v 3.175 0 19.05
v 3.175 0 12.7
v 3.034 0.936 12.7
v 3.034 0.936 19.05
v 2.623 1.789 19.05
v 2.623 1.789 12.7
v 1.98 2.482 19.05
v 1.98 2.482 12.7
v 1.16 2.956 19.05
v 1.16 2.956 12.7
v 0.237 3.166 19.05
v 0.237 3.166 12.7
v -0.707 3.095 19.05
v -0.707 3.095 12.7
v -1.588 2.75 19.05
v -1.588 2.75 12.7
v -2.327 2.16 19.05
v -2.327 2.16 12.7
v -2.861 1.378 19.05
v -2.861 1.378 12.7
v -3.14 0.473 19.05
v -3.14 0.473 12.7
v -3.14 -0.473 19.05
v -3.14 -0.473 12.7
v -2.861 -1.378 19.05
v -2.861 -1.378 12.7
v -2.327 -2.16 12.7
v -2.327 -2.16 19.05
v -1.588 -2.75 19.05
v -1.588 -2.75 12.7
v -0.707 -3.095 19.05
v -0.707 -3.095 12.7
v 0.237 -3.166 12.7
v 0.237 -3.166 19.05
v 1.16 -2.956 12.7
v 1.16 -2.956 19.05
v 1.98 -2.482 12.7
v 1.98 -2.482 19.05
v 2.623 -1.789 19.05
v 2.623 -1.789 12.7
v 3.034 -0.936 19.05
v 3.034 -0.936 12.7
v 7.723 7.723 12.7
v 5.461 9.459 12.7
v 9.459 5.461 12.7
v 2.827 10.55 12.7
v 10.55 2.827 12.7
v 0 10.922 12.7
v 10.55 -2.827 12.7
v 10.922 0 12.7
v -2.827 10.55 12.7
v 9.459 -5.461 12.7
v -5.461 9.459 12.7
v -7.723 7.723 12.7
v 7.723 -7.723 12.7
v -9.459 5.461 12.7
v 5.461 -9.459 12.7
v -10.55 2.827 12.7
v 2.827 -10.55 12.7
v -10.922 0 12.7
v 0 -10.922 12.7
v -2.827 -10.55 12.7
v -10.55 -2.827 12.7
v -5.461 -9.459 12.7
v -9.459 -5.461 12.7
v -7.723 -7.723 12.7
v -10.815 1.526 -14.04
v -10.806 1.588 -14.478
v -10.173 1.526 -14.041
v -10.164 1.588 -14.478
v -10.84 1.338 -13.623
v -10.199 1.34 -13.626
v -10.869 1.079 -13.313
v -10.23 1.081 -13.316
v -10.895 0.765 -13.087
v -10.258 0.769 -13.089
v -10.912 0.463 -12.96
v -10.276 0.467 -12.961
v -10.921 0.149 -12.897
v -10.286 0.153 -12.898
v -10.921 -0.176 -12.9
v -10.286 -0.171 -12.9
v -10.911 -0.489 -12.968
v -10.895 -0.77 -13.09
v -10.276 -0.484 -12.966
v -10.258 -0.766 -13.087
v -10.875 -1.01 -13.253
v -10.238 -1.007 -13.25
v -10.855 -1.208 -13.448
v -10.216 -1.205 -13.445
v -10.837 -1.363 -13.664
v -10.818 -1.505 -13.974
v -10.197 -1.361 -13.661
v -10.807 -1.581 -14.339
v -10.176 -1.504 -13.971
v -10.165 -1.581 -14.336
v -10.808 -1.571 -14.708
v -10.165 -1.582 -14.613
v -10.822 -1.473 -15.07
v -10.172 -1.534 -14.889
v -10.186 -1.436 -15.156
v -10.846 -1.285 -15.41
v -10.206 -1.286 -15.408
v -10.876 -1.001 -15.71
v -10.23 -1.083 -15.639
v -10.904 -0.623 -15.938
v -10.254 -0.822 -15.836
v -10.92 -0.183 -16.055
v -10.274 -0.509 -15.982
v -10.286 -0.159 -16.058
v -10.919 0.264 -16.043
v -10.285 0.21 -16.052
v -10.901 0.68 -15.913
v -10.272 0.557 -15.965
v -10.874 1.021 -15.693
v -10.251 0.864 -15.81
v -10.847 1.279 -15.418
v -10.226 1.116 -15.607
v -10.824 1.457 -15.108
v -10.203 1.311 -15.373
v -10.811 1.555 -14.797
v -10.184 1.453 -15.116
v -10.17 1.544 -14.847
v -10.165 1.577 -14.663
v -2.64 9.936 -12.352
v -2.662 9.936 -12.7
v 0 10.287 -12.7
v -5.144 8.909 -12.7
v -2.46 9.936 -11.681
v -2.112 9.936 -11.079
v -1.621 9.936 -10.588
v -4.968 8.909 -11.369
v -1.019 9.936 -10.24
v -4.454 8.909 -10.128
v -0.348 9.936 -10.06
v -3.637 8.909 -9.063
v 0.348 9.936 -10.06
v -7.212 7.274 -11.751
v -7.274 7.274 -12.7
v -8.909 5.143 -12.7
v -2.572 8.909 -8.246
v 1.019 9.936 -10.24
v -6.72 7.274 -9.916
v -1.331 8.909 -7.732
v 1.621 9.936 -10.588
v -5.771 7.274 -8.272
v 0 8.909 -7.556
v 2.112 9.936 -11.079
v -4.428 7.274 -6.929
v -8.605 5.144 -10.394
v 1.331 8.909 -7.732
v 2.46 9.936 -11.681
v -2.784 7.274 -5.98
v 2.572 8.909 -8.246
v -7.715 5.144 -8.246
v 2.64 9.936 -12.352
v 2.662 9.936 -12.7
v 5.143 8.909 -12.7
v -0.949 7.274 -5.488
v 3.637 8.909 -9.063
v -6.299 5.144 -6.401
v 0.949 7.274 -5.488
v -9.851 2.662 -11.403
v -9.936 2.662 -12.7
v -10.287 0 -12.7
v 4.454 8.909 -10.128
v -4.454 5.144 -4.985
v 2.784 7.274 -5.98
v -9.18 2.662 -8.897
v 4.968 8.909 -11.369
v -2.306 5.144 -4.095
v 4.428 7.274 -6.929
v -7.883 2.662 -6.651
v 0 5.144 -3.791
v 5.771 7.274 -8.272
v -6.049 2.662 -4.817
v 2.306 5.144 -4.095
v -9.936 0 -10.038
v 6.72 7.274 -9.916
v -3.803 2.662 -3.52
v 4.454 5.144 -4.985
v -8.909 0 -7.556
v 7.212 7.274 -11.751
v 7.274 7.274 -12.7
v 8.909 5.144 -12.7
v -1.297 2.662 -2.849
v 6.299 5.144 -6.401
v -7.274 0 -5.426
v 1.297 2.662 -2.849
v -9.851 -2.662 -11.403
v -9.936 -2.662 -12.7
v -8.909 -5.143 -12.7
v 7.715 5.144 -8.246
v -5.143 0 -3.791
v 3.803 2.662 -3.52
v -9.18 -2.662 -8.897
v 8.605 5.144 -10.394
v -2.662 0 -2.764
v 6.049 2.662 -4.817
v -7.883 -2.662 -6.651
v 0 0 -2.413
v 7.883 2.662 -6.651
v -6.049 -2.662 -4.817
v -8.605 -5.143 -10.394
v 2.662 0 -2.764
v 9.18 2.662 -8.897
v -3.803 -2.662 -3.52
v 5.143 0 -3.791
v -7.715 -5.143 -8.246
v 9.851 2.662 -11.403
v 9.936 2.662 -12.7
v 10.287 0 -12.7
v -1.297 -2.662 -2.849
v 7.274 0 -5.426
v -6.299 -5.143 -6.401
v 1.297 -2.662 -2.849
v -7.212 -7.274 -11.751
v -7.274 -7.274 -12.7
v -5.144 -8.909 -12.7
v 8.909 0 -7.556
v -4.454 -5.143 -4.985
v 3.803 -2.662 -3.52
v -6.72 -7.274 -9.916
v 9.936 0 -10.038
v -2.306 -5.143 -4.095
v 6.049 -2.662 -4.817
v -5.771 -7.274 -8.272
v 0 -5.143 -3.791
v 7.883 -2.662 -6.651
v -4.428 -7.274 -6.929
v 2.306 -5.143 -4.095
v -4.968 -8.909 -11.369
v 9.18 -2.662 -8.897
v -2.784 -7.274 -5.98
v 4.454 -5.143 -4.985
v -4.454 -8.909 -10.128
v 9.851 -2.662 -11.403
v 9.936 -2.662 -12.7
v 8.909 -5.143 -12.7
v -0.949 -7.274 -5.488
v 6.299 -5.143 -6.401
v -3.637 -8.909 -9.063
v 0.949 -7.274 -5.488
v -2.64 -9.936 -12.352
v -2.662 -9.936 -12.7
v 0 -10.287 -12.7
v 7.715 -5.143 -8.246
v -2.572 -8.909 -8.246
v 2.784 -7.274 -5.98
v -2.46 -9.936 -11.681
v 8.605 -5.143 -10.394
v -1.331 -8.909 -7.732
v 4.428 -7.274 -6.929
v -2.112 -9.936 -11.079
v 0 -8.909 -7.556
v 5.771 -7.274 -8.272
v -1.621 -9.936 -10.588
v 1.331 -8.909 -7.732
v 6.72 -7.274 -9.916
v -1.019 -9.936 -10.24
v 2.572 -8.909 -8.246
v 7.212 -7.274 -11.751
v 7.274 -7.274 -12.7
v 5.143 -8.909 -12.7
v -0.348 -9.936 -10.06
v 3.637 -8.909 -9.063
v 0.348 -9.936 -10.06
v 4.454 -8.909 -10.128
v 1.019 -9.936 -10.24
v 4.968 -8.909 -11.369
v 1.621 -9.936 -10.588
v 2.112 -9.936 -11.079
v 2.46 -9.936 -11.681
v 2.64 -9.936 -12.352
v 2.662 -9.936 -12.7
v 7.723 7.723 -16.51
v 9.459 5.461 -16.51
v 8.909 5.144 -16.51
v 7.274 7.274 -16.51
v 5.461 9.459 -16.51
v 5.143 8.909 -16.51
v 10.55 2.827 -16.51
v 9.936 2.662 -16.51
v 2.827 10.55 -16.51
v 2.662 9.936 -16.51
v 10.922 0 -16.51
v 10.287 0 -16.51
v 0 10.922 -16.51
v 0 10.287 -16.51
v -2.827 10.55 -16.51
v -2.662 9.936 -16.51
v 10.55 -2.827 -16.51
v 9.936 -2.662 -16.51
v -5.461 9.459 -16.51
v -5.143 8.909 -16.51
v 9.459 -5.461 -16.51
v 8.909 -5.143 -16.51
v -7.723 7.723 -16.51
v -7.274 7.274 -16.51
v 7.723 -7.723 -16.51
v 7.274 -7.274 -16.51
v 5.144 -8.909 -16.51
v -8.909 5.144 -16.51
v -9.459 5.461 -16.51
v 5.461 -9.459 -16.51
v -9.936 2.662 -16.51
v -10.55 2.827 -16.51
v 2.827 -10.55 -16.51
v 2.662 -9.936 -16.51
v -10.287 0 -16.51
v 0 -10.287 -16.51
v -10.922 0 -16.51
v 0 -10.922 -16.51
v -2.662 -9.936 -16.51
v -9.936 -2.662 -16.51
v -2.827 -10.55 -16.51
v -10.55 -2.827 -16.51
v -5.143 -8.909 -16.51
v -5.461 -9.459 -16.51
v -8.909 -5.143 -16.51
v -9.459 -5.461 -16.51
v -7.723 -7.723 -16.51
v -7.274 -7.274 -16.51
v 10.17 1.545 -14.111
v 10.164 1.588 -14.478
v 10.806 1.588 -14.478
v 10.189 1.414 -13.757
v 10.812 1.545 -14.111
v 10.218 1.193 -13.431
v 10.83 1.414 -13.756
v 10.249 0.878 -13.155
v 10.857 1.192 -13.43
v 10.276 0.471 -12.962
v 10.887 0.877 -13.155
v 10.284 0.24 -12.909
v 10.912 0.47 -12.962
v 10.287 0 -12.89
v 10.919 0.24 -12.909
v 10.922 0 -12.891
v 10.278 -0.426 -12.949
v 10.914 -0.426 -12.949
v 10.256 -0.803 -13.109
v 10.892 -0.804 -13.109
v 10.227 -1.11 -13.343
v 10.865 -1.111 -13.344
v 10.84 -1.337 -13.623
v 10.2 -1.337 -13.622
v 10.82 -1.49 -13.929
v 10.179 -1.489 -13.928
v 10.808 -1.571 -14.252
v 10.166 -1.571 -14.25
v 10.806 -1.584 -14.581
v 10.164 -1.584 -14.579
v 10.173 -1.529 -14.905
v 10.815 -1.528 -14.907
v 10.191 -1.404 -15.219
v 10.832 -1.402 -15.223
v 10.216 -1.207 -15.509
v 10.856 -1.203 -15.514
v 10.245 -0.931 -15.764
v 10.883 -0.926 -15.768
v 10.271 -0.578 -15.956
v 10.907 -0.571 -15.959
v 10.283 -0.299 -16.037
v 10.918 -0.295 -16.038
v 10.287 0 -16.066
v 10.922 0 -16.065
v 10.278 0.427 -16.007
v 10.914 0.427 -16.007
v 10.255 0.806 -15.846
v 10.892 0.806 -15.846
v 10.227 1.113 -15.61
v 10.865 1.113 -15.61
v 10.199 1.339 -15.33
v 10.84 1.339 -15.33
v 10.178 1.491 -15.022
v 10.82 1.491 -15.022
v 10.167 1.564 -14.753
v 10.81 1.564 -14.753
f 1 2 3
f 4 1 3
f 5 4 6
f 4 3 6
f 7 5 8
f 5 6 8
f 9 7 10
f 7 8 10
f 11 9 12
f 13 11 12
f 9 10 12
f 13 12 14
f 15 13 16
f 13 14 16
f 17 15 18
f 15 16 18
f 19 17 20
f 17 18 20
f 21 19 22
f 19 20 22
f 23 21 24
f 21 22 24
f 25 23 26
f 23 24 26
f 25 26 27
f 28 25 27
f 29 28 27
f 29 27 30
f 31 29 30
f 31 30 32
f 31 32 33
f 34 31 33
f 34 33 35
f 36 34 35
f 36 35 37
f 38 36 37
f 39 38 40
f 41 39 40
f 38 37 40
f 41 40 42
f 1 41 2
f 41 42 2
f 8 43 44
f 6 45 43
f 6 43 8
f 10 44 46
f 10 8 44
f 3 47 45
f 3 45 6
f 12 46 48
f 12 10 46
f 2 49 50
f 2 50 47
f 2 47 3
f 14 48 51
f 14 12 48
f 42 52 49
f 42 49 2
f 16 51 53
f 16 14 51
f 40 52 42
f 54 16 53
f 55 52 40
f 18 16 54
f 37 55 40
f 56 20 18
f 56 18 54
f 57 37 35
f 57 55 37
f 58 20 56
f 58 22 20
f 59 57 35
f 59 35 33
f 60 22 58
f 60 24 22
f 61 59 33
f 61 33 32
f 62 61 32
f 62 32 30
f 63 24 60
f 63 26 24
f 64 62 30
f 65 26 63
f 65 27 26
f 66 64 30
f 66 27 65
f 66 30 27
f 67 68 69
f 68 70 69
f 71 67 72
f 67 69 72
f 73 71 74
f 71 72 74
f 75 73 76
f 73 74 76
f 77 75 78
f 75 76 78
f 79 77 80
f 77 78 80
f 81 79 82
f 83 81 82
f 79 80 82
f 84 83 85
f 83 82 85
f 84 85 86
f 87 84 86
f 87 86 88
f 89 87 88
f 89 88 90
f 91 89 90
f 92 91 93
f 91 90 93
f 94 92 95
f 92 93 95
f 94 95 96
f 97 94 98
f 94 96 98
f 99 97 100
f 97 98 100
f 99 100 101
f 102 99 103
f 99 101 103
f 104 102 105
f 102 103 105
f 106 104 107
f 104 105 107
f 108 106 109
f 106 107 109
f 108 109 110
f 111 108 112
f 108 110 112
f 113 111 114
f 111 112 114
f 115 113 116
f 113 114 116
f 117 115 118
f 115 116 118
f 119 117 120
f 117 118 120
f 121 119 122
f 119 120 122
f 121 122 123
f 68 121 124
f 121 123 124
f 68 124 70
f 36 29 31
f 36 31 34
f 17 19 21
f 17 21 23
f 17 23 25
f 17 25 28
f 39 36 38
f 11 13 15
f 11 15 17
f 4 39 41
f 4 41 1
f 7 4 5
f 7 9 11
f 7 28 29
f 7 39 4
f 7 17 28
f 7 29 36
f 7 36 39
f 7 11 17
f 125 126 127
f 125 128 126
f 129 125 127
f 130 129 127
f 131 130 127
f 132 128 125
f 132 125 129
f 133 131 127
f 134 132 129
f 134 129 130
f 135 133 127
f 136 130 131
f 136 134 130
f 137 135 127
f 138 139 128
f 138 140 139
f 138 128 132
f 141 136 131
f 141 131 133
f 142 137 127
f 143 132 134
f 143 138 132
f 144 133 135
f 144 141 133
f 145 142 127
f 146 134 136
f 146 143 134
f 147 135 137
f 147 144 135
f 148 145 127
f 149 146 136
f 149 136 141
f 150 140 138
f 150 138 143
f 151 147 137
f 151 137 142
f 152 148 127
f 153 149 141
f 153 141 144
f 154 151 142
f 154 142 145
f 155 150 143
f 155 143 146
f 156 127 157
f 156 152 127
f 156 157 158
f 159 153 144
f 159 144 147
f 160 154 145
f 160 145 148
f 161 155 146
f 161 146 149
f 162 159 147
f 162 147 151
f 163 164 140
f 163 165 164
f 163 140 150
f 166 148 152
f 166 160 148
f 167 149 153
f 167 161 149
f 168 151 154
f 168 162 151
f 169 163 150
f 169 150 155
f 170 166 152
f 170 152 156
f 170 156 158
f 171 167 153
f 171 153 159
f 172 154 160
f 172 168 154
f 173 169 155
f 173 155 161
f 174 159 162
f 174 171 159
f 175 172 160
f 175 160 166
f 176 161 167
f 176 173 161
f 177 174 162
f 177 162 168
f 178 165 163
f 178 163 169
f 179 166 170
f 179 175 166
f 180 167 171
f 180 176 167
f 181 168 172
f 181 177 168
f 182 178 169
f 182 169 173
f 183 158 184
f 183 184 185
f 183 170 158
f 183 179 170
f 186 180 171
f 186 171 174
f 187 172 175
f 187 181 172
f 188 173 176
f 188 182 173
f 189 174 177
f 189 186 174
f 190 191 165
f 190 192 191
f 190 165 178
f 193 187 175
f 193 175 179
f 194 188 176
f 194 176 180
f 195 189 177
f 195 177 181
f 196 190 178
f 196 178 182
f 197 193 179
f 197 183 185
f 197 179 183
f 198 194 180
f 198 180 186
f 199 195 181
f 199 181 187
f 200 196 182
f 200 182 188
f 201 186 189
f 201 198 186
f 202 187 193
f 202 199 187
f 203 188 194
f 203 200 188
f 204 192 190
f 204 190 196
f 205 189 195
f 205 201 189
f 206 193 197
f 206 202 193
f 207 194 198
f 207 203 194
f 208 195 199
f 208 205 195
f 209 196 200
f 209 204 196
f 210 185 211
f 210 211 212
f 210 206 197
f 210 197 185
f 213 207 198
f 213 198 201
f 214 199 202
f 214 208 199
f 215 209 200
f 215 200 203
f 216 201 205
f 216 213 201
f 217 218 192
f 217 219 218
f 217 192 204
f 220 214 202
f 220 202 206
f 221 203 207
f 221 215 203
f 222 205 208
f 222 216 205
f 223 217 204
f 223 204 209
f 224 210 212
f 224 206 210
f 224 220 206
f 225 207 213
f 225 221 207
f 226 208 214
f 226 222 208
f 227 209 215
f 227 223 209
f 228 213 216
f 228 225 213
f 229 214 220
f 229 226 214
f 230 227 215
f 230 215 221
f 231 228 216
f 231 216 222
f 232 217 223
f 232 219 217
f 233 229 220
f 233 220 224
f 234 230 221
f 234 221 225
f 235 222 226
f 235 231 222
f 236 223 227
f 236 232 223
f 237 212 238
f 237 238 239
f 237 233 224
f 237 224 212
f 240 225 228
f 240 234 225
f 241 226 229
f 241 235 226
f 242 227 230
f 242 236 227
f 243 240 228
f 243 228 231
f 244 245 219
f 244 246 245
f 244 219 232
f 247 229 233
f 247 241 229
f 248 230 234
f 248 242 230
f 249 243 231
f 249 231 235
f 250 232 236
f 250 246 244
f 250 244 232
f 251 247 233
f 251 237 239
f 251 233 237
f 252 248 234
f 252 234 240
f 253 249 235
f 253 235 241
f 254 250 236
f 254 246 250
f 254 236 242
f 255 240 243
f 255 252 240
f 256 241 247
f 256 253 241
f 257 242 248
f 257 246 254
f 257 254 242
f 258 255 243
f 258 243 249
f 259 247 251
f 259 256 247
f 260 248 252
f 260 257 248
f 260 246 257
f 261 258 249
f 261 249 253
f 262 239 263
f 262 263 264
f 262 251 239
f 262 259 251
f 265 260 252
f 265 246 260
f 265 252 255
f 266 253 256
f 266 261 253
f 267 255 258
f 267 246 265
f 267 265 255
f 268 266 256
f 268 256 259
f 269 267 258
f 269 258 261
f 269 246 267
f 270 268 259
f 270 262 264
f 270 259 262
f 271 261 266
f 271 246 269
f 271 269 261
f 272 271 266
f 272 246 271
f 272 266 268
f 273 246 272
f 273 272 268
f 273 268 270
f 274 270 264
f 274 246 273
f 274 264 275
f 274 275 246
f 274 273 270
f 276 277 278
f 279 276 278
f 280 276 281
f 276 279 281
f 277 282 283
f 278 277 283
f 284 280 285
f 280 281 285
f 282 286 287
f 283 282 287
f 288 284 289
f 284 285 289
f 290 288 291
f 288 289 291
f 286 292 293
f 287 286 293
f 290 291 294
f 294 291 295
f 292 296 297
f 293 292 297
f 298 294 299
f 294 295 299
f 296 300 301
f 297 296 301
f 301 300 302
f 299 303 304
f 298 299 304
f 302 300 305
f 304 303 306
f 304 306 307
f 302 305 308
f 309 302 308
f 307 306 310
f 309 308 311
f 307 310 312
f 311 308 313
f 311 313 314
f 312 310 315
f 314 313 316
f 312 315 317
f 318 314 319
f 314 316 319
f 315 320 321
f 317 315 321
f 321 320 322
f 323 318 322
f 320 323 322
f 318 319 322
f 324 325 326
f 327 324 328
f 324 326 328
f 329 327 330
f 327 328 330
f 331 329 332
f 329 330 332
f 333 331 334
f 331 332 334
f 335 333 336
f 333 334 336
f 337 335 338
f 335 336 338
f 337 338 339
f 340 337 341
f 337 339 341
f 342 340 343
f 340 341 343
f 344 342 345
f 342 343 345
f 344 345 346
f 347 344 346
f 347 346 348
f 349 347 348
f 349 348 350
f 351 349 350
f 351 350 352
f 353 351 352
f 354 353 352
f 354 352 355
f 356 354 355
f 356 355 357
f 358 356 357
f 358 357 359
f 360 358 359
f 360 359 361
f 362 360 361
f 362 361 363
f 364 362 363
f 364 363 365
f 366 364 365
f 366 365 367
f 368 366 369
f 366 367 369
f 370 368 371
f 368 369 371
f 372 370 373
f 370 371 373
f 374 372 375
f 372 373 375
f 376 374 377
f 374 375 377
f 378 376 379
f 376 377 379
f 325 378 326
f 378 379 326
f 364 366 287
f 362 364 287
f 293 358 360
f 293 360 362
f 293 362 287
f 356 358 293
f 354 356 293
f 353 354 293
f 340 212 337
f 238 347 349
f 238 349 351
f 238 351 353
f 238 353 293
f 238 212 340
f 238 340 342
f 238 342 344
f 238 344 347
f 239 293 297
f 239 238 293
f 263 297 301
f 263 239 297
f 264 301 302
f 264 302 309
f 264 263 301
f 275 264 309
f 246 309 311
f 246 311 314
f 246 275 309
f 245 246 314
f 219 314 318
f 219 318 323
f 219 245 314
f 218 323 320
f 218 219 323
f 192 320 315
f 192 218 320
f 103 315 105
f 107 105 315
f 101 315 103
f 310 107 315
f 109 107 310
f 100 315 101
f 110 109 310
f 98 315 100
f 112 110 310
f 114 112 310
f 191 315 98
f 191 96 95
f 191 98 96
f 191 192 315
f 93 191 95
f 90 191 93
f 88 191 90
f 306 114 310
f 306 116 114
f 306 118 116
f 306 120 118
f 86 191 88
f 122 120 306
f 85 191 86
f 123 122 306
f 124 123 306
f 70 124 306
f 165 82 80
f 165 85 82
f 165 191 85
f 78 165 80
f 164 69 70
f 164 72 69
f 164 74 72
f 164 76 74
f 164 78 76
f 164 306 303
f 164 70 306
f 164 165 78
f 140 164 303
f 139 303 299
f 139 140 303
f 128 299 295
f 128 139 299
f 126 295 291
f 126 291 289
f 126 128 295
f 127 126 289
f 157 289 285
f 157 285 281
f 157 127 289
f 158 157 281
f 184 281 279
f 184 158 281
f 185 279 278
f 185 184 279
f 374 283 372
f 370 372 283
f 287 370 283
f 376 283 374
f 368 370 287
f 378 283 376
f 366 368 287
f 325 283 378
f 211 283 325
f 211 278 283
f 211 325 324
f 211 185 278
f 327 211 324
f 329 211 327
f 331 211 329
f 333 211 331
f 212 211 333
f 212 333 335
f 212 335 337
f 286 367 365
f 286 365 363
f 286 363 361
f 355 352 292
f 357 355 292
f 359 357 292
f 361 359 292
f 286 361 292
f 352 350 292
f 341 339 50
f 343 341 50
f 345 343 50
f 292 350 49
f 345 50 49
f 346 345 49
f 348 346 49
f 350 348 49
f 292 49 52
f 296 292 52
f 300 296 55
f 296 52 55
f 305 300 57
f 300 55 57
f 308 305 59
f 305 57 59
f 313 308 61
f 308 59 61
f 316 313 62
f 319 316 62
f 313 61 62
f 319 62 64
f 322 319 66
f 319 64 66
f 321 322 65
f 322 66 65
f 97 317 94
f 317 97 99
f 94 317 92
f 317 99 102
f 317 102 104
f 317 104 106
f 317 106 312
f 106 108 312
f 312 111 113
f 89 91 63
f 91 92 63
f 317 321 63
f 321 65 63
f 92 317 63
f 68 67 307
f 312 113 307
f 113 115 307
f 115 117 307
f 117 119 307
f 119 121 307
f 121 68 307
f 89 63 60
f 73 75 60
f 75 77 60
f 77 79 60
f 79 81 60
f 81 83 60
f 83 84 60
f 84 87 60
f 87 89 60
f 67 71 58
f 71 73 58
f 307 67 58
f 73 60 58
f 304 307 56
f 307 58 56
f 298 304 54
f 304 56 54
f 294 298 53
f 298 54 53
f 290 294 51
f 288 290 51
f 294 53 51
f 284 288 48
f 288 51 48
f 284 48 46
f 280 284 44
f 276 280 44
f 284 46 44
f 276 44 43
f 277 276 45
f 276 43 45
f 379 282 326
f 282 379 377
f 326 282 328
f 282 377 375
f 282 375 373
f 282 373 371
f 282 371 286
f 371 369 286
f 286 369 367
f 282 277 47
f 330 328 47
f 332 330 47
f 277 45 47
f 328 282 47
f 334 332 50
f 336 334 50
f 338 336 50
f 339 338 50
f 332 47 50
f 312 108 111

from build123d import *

# Parameters (mm, degrees)
F0_W     = 10.922
F0_H     = 25.4
F4_W     = 0.635
F4_H     = 3.81
F6_R     = 1.5875
F7_DEPTH = 12.7
F8_R     = 3.175
F9_DEPTH = 6.35


with BuildPart() as f1:
    # F0 (on Front) → F1 (revolve)
    with BuildSketch(Plane.XZ):
        with Locations((5.461, 0)):
            Rectangle(F0_W, F0_H)
    revolve(axis=Axis((0, 0, 0), (0, 0, -1)))

    # F2 (on face) → F3 (revolve, cut)
    with BuildSketch(Plane(origin=(0, 0, -12.7), x_dir=(1, 0, 0), z_dir=(0, 0, -1))):
        with BuildLine():
            Line((0, 10.287), (0, -10.287))
            ThreePointArc((0, -10.287), (10.287, 0), (0, 10.287))
        make_face()
    revolve(axis=Axis((0, 0, -12.7), (0, 1, 0)), mode=Mode.SUBTRACT)

    # F4 (on Front) → F5 (revolve)
    with BuildSketch(Plane.XZ):
        with Locations((10.6045, -14.605)):
            Rectangle(F4_W, F4_H)
    revolve(axis=Axis((0, 0, -6.3285445794), (0, 0, -1)))

    # F6 (on Right) → F7 (cut, symmetric)
    with BuildSketch(Plane.YZ):
        with Locations((0, -14.478)):
            Circle(F6_R)
    extrude(amount=F7_DEPTH, both=True, mode=Mode.SUBTRACT)

    # F8 (on face) → F9 (join)
    with BuildSketch(Plane.XY.offset(12.7)):
        Circle(F8_R)
    extrude(amount=F9_DEPTH)


solid = f1.part
